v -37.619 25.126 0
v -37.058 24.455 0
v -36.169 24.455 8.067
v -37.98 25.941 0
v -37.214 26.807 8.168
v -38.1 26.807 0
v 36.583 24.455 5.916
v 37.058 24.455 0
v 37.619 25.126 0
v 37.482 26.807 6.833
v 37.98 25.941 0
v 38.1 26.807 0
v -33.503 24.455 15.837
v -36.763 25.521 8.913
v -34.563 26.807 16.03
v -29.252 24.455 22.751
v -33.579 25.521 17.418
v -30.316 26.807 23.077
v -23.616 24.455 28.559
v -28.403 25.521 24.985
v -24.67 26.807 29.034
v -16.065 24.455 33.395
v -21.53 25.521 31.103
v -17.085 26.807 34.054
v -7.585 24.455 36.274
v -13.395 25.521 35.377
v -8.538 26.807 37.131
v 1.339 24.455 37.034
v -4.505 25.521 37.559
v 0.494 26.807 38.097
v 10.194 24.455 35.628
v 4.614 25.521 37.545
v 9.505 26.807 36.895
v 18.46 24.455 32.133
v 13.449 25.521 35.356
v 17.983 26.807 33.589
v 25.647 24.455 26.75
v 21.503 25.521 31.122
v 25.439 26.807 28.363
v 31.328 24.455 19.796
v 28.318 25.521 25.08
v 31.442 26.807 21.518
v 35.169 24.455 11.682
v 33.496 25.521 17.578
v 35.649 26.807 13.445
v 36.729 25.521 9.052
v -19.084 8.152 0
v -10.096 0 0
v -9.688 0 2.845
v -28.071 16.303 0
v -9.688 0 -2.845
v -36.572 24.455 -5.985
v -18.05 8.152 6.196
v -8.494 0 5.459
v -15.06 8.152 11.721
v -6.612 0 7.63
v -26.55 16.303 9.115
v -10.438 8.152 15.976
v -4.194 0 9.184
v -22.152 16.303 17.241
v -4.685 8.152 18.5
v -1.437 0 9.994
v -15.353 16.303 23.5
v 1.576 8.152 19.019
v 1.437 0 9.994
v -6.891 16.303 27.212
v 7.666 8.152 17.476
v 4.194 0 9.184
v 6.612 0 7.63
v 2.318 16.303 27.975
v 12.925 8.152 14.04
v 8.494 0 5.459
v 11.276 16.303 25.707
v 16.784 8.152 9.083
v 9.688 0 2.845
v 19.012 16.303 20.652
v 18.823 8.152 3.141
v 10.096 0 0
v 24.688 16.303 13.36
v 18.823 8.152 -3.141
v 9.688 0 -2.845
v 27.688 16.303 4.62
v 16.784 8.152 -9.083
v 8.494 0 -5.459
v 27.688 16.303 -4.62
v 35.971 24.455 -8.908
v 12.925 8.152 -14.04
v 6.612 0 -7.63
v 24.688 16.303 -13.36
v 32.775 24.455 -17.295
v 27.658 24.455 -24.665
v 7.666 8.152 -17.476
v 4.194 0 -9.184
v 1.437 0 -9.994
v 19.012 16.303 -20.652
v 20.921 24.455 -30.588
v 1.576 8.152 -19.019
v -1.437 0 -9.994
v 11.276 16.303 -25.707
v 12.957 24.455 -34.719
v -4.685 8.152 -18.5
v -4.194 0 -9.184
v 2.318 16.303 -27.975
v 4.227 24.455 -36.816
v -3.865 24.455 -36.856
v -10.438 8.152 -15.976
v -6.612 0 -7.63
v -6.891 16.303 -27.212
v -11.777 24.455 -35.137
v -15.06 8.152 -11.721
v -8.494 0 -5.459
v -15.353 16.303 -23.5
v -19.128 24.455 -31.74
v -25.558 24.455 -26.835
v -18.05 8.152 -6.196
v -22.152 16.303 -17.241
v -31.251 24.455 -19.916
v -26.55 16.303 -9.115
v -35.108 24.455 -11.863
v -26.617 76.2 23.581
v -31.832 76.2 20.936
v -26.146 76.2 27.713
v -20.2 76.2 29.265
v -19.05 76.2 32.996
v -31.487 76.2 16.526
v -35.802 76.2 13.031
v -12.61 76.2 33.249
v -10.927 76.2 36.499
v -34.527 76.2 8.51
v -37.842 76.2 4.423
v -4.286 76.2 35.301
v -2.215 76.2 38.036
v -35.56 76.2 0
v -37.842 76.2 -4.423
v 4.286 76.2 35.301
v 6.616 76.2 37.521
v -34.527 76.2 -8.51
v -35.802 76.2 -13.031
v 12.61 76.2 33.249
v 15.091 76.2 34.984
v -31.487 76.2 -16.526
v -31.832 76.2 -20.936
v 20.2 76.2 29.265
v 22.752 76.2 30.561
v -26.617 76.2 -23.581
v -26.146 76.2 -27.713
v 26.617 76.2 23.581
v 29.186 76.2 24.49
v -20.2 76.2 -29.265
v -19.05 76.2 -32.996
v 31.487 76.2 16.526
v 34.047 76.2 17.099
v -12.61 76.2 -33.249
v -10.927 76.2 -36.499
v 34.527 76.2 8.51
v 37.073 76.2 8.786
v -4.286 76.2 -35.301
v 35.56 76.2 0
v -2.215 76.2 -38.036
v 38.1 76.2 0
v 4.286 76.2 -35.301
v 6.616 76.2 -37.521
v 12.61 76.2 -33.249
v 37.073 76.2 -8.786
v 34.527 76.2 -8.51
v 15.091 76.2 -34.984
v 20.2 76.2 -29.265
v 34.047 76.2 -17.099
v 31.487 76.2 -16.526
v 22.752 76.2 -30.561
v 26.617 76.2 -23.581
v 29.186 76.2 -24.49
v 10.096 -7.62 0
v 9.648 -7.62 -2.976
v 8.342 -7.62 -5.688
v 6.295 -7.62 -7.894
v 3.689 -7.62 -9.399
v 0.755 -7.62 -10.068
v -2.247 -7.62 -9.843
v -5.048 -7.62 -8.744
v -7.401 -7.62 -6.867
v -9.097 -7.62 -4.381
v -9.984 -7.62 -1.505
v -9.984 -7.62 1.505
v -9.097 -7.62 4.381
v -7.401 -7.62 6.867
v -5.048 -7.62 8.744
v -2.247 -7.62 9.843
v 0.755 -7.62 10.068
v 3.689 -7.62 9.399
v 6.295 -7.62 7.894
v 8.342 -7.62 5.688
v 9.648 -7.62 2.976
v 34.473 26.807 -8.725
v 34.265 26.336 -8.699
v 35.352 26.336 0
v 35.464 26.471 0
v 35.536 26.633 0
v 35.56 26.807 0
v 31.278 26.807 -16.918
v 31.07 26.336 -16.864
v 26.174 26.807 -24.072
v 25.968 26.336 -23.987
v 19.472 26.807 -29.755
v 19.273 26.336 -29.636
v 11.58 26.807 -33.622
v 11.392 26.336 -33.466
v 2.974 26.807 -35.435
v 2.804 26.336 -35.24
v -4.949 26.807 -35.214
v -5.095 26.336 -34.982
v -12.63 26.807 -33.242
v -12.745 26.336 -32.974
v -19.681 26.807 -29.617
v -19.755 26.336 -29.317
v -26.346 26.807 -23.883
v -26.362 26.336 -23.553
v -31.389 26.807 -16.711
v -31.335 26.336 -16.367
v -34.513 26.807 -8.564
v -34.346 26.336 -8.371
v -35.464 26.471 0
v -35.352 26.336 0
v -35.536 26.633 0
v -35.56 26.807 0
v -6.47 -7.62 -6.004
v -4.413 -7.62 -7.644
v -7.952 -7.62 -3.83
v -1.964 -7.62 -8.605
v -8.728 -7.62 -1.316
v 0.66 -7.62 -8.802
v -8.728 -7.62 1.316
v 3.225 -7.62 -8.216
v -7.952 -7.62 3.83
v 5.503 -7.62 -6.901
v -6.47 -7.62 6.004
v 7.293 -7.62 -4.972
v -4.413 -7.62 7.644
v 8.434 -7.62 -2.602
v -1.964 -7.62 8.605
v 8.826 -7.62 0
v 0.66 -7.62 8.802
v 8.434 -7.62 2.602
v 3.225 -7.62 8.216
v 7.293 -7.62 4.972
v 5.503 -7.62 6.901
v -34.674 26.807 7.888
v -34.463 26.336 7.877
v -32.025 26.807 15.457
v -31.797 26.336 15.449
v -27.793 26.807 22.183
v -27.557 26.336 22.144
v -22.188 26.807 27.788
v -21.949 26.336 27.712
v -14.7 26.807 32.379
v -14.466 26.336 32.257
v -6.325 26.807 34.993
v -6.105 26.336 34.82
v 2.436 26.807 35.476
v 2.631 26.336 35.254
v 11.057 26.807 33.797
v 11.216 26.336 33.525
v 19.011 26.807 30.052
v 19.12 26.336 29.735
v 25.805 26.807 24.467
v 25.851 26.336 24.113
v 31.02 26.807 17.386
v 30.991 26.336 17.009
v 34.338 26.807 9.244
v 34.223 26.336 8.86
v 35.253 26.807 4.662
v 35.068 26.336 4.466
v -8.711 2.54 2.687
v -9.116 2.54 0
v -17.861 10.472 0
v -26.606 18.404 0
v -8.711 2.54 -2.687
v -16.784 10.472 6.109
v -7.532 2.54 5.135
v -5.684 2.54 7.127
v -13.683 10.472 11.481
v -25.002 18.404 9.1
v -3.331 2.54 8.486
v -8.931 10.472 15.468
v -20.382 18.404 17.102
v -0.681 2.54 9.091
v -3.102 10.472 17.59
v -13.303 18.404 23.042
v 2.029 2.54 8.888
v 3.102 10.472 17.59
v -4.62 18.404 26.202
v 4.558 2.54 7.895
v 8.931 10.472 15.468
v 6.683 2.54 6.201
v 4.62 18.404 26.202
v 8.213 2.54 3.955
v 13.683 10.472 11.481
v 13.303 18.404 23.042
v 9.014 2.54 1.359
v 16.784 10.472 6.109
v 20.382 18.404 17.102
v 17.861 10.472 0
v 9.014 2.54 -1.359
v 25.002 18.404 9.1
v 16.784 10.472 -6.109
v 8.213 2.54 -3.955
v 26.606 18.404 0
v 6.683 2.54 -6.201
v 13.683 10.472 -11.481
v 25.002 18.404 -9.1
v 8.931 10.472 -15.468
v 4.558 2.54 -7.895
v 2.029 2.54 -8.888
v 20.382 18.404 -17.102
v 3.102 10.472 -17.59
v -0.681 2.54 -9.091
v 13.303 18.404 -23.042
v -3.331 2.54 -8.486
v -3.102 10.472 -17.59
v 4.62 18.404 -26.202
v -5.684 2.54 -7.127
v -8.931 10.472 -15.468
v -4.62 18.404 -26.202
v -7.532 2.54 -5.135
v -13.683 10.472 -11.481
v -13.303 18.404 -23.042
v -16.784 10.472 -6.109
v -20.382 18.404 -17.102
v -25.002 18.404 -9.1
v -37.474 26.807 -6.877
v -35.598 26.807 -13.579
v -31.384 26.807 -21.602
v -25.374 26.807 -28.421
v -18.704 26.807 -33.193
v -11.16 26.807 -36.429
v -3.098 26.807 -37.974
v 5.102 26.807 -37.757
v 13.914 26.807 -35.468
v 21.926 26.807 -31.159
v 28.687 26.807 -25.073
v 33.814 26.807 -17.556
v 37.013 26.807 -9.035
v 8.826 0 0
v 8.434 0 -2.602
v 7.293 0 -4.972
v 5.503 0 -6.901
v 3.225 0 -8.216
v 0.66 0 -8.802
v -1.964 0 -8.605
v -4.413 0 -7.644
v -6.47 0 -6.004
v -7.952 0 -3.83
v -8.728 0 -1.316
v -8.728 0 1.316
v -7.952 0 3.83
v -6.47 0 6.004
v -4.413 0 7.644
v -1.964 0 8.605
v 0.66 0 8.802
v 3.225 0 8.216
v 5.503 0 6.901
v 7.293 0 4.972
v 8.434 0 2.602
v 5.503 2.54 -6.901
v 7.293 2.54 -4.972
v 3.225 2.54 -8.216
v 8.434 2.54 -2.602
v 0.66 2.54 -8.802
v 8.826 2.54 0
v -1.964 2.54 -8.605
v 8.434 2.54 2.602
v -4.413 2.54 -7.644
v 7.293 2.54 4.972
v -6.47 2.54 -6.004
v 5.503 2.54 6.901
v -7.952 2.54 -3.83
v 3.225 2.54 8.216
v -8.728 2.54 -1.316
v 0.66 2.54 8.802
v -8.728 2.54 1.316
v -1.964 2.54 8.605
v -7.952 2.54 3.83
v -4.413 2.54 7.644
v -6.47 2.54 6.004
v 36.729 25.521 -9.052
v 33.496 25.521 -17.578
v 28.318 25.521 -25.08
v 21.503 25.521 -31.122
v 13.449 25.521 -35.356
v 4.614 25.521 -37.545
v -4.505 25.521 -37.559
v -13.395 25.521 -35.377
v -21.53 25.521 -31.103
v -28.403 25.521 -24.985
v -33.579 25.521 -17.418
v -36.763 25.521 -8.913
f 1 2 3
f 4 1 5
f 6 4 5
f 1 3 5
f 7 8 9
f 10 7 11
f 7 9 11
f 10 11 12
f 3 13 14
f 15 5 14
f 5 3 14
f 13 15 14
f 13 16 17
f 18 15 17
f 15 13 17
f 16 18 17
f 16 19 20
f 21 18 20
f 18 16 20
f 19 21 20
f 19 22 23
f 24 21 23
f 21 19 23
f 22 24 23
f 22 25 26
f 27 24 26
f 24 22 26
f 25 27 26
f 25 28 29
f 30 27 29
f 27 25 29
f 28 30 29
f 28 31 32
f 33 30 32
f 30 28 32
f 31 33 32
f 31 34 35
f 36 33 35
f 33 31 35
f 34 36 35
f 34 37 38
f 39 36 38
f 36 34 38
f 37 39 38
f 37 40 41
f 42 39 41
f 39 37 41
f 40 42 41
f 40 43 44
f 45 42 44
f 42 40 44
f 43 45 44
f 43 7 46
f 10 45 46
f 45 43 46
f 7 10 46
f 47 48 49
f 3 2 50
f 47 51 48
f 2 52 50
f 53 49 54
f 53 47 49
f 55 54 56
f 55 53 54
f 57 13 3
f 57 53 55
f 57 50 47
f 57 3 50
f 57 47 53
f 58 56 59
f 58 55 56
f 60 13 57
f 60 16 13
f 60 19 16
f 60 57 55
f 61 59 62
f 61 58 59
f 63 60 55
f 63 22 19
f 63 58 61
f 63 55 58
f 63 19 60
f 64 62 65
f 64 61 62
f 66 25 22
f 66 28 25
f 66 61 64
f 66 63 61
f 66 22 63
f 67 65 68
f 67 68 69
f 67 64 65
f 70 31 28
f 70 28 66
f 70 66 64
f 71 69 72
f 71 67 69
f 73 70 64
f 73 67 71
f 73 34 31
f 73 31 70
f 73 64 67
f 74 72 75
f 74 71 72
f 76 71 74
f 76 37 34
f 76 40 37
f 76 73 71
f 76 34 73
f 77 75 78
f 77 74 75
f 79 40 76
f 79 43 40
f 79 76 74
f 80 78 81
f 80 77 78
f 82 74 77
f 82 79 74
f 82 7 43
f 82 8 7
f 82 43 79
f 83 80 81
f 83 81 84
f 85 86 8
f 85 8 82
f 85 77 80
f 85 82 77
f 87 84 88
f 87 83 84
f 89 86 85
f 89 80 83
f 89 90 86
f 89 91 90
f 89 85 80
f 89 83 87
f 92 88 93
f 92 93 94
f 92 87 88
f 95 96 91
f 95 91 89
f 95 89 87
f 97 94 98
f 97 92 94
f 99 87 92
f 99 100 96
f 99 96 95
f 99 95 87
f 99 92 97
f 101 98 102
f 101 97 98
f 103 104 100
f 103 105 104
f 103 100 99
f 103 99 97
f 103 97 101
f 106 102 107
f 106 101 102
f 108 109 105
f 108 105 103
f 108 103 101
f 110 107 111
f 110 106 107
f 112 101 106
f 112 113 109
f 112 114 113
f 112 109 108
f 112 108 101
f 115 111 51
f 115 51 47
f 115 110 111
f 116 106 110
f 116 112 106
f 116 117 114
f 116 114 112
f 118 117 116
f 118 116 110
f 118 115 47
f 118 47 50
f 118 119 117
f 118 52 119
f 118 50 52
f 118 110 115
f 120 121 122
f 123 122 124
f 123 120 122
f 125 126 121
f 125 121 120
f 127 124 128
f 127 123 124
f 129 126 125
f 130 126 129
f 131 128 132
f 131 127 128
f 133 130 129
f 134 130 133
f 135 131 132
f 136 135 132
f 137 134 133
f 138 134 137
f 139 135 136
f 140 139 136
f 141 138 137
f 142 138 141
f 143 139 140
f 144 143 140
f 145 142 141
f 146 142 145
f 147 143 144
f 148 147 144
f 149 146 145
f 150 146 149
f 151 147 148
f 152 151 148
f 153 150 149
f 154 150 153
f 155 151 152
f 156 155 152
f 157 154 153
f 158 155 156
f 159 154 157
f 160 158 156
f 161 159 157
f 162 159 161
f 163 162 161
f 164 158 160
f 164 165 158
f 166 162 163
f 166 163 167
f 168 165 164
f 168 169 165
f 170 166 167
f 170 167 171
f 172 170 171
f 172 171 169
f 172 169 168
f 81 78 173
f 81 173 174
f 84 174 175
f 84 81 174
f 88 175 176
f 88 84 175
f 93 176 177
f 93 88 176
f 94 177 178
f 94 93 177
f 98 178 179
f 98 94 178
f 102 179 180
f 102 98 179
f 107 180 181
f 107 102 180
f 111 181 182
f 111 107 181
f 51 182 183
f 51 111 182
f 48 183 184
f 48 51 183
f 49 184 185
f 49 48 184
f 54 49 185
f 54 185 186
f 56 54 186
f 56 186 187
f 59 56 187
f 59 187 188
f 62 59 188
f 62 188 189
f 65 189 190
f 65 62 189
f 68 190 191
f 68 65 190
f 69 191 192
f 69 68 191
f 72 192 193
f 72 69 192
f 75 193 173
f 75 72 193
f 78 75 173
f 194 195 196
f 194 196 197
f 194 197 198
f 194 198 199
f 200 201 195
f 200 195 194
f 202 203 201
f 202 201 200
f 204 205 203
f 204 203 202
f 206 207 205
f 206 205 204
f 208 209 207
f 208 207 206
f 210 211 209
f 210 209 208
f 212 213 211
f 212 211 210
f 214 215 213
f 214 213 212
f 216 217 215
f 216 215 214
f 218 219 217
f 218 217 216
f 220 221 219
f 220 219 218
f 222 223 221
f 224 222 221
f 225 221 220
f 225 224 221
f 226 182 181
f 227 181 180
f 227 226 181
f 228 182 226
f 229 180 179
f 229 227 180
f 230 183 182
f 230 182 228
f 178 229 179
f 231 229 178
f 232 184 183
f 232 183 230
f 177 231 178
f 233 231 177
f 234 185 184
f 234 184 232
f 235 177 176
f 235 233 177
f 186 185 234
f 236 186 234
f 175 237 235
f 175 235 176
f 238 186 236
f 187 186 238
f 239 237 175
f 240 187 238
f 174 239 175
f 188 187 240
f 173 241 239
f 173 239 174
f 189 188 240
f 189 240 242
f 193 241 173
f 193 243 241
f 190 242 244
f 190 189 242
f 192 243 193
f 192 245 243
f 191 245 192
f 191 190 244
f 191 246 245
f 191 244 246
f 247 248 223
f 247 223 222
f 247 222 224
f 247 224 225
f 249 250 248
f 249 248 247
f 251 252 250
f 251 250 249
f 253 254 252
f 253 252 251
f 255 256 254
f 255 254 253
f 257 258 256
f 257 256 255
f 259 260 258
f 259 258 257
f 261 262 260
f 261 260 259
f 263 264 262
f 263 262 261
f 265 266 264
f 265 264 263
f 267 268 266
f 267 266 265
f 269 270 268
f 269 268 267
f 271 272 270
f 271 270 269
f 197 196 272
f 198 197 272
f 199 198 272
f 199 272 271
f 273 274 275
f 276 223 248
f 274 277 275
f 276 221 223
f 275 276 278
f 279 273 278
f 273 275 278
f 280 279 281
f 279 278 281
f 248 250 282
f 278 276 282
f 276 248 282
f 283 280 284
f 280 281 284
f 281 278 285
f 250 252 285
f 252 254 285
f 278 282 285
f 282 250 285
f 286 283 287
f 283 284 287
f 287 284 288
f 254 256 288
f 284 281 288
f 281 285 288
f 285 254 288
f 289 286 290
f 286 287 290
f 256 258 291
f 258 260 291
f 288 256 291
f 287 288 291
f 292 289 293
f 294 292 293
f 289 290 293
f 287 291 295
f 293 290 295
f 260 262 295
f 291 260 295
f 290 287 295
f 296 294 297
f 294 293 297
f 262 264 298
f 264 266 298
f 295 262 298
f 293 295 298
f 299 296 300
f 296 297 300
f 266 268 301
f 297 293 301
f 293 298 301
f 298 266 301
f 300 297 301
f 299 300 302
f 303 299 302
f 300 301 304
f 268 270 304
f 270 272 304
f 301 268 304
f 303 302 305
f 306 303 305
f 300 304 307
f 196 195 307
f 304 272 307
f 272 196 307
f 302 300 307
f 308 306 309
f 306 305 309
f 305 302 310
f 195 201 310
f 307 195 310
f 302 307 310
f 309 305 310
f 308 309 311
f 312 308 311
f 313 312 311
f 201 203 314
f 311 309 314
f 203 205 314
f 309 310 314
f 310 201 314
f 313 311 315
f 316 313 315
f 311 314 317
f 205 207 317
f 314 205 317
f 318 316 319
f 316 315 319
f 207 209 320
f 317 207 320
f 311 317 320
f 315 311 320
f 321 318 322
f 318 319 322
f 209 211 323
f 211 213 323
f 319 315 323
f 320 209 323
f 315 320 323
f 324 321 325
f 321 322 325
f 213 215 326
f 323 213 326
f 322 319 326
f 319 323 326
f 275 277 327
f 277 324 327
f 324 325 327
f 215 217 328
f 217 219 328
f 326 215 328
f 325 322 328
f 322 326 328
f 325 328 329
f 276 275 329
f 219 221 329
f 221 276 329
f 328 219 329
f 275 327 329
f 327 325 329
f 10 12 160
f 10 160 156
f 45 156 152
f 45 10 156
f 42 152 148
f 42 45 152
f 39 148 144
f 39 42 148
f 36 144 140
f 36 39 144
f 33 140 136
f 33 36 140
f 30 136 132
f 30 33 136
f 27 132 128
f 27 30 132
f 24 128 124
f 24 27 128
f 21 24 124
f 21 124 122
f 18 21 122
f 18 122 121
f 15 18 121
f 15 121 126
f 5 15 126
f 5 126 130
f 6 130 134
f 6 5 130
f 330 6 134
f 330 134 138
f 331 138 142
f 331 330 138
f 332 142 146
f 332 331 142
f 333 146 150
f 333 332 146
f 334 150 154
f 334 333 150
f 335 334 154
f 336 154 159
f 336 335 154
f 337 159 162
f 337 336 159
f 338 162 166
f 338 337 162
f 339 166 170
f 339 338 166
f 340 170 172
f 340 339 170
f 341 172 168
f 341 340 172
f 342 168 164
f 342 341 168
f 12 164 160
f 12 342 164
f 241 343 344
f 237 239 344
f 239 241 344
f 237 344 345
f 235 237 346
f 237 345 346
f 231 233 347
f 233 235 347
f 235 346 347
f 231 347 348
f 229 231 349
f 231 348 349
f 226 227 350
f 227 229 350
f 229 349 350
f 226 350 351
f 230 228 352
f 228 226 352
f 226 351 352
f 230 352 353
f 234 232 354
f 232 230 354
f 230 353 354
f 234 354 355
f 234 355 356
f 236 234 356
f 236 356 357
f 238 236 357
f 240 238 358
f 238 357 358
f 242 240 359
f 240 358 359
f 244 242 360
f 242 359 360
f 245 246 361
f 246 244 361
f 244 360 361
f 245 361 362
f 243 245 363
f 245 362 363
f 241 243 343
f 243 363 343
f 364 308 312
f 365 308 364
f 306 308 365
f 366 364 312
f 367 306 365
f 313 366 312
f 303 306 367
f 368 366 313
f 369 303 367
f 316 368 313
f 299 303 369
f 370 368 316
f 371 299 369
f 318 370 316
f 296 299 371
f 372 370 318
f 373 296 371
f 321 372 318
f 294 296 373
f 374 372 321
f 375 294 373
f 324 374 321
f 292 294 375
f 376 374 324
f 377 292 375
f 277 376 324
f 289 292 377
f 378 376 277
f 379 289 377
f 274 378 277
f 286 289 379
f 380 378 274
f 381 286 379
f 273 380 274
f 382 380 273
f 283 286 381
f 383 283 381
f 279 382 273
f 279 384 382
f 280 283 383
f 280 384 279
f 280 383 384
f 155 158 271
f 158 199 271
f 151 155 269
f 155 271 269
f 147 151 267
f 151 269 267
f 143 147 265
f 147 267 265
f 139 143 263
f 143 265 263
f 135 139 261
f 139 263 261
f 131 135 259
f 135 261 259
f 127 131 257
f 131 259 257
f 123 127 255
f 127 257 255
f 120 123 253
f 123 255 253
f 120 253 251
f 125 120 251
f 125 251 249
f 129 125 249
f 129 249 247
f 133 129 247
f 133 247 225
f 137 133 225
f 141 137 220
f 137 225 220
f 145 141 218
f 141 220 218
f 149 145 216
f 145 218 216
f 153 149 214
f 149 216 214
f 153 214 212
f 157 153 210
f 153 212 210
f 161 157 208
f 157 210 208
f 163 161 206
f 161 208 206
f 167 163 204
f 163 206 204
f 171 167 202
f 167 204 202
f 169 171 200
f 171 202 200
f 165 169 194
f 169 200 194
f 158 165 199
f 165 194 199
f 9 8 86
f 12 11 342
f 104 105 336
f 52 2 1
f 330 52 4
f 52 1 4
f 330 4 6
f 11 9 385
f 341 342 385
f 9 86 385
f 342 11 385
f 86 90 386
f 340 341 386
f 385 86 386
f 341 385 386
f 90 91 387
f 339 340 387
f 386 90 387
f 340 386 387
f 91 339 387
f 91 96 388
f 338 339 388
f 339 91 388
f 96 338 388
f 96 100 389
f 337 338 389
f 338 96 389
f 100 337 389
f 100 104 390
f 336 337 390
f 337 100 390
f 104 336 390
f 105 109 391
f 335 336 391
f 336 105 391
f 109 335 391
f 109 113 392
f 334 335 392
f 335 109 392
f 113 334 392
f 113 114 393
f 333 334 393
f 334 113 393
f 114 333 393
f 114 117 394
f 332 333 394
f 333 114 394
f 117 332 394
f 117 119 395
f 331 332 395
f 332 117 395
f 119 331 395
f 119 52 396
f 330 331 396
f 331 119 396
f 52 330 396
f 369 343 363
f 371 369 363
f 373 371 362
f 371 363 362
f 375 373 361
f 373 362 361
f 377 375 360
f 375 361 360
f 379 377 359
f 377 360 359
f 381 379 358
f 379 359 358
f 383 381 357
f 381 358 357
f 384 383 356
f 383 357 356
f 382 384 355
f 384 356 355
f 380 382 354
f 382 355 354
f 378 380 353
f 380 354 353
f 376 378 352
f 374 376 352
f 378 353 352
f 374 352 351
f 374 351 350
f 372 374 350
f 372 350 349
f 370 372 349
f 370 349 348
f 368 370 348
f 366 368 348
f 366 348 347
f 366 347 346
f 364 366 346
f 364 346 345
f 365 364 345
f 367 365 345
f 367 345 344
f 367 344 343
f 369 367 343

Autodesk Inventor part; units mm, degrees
ref_plane "YZ Plane" through (0, 0, 0) normal (1, 0, 0) x (0, 1, 0)
ref_plane "XZ Plane" through (0, 0, 0) normal (0, 1, 0) x (-1, 0, 0)
ref_plane "XY Plane" through (0, 0, 0) normal (0, 0, 1) x (1, 0, 0)
sketch "Sketch1" plane through (0, 0, 0) normal (0, 1, 0) x (-1, 0, 0)
  circle A0 centre (0, 0) radius 10.0965
  dimension "d0" = 20.193
extrude "Extrusion1" add sketch "Sketch1" along normal blind 25.4
sketch "Sketch2" plane through (0, 25.4, 0) normal (0, 1, 0) x (1, 0, 0)
  circle A0 centre (0, 0) radius 10.0965 projected
  circle A1 centre (0, 0) radius 38.1
  dimension "d3" = 76.2
extrude "Extrusion2" add sketch "Sketch2" along normal blind 50.8
loft "Loft1" add section 1 edges at (10.0965, 0, 0) section 2 edges at (-38.1, 25.4, 0)
fillet "Fillet1" radius 3.175 2 edges at (0, 25.4, -38.1) (0, 25.4, 38.1)
sketch "Sketch3" plane through (0, 25.4, 0) normal (0, 1, 0) x (1, 0, 0)
  circle A0 centre (0, 0) radius 10.0965 projected
  circle A1 centre (0, 0) radius 10.0965
extrude "Extrusion3" add sketch "Sketch3" along normal blind 50.8
shell "Shell1" thickness 2.54 removed faces 1 at (18.352, 76.2, 0)
sketch "Sketch4" plane through (0, 0, 0) normal (0, -1, 0) x (1, 0, 0)
  circle A0 centre (0, 0) radius 10.0965 projected
  circle A1 centre (0, 0) radius 8.8265
  dimension "d14" = 17.653
extrude "Extrusion4" cut sketch "Sketch4" against normal blind 50.8 contours A1
sketch "Sketch5" plane through (0, 0, 0) normal (0, -1, 0) x (1, 0, 0)
  circle A0 centre (0, 0) radius 8.8265 projected
  circle A1 centre (0, 0) radius 10.0965 projected
  circle A2 centre (0, 0) radius 8.8265
  circle A3 centre (0, 0) radius 10.0965
extrude "Extrusion5" add sketch "Sketch5" along normal blind 7.62
properties part number "Hopper"
